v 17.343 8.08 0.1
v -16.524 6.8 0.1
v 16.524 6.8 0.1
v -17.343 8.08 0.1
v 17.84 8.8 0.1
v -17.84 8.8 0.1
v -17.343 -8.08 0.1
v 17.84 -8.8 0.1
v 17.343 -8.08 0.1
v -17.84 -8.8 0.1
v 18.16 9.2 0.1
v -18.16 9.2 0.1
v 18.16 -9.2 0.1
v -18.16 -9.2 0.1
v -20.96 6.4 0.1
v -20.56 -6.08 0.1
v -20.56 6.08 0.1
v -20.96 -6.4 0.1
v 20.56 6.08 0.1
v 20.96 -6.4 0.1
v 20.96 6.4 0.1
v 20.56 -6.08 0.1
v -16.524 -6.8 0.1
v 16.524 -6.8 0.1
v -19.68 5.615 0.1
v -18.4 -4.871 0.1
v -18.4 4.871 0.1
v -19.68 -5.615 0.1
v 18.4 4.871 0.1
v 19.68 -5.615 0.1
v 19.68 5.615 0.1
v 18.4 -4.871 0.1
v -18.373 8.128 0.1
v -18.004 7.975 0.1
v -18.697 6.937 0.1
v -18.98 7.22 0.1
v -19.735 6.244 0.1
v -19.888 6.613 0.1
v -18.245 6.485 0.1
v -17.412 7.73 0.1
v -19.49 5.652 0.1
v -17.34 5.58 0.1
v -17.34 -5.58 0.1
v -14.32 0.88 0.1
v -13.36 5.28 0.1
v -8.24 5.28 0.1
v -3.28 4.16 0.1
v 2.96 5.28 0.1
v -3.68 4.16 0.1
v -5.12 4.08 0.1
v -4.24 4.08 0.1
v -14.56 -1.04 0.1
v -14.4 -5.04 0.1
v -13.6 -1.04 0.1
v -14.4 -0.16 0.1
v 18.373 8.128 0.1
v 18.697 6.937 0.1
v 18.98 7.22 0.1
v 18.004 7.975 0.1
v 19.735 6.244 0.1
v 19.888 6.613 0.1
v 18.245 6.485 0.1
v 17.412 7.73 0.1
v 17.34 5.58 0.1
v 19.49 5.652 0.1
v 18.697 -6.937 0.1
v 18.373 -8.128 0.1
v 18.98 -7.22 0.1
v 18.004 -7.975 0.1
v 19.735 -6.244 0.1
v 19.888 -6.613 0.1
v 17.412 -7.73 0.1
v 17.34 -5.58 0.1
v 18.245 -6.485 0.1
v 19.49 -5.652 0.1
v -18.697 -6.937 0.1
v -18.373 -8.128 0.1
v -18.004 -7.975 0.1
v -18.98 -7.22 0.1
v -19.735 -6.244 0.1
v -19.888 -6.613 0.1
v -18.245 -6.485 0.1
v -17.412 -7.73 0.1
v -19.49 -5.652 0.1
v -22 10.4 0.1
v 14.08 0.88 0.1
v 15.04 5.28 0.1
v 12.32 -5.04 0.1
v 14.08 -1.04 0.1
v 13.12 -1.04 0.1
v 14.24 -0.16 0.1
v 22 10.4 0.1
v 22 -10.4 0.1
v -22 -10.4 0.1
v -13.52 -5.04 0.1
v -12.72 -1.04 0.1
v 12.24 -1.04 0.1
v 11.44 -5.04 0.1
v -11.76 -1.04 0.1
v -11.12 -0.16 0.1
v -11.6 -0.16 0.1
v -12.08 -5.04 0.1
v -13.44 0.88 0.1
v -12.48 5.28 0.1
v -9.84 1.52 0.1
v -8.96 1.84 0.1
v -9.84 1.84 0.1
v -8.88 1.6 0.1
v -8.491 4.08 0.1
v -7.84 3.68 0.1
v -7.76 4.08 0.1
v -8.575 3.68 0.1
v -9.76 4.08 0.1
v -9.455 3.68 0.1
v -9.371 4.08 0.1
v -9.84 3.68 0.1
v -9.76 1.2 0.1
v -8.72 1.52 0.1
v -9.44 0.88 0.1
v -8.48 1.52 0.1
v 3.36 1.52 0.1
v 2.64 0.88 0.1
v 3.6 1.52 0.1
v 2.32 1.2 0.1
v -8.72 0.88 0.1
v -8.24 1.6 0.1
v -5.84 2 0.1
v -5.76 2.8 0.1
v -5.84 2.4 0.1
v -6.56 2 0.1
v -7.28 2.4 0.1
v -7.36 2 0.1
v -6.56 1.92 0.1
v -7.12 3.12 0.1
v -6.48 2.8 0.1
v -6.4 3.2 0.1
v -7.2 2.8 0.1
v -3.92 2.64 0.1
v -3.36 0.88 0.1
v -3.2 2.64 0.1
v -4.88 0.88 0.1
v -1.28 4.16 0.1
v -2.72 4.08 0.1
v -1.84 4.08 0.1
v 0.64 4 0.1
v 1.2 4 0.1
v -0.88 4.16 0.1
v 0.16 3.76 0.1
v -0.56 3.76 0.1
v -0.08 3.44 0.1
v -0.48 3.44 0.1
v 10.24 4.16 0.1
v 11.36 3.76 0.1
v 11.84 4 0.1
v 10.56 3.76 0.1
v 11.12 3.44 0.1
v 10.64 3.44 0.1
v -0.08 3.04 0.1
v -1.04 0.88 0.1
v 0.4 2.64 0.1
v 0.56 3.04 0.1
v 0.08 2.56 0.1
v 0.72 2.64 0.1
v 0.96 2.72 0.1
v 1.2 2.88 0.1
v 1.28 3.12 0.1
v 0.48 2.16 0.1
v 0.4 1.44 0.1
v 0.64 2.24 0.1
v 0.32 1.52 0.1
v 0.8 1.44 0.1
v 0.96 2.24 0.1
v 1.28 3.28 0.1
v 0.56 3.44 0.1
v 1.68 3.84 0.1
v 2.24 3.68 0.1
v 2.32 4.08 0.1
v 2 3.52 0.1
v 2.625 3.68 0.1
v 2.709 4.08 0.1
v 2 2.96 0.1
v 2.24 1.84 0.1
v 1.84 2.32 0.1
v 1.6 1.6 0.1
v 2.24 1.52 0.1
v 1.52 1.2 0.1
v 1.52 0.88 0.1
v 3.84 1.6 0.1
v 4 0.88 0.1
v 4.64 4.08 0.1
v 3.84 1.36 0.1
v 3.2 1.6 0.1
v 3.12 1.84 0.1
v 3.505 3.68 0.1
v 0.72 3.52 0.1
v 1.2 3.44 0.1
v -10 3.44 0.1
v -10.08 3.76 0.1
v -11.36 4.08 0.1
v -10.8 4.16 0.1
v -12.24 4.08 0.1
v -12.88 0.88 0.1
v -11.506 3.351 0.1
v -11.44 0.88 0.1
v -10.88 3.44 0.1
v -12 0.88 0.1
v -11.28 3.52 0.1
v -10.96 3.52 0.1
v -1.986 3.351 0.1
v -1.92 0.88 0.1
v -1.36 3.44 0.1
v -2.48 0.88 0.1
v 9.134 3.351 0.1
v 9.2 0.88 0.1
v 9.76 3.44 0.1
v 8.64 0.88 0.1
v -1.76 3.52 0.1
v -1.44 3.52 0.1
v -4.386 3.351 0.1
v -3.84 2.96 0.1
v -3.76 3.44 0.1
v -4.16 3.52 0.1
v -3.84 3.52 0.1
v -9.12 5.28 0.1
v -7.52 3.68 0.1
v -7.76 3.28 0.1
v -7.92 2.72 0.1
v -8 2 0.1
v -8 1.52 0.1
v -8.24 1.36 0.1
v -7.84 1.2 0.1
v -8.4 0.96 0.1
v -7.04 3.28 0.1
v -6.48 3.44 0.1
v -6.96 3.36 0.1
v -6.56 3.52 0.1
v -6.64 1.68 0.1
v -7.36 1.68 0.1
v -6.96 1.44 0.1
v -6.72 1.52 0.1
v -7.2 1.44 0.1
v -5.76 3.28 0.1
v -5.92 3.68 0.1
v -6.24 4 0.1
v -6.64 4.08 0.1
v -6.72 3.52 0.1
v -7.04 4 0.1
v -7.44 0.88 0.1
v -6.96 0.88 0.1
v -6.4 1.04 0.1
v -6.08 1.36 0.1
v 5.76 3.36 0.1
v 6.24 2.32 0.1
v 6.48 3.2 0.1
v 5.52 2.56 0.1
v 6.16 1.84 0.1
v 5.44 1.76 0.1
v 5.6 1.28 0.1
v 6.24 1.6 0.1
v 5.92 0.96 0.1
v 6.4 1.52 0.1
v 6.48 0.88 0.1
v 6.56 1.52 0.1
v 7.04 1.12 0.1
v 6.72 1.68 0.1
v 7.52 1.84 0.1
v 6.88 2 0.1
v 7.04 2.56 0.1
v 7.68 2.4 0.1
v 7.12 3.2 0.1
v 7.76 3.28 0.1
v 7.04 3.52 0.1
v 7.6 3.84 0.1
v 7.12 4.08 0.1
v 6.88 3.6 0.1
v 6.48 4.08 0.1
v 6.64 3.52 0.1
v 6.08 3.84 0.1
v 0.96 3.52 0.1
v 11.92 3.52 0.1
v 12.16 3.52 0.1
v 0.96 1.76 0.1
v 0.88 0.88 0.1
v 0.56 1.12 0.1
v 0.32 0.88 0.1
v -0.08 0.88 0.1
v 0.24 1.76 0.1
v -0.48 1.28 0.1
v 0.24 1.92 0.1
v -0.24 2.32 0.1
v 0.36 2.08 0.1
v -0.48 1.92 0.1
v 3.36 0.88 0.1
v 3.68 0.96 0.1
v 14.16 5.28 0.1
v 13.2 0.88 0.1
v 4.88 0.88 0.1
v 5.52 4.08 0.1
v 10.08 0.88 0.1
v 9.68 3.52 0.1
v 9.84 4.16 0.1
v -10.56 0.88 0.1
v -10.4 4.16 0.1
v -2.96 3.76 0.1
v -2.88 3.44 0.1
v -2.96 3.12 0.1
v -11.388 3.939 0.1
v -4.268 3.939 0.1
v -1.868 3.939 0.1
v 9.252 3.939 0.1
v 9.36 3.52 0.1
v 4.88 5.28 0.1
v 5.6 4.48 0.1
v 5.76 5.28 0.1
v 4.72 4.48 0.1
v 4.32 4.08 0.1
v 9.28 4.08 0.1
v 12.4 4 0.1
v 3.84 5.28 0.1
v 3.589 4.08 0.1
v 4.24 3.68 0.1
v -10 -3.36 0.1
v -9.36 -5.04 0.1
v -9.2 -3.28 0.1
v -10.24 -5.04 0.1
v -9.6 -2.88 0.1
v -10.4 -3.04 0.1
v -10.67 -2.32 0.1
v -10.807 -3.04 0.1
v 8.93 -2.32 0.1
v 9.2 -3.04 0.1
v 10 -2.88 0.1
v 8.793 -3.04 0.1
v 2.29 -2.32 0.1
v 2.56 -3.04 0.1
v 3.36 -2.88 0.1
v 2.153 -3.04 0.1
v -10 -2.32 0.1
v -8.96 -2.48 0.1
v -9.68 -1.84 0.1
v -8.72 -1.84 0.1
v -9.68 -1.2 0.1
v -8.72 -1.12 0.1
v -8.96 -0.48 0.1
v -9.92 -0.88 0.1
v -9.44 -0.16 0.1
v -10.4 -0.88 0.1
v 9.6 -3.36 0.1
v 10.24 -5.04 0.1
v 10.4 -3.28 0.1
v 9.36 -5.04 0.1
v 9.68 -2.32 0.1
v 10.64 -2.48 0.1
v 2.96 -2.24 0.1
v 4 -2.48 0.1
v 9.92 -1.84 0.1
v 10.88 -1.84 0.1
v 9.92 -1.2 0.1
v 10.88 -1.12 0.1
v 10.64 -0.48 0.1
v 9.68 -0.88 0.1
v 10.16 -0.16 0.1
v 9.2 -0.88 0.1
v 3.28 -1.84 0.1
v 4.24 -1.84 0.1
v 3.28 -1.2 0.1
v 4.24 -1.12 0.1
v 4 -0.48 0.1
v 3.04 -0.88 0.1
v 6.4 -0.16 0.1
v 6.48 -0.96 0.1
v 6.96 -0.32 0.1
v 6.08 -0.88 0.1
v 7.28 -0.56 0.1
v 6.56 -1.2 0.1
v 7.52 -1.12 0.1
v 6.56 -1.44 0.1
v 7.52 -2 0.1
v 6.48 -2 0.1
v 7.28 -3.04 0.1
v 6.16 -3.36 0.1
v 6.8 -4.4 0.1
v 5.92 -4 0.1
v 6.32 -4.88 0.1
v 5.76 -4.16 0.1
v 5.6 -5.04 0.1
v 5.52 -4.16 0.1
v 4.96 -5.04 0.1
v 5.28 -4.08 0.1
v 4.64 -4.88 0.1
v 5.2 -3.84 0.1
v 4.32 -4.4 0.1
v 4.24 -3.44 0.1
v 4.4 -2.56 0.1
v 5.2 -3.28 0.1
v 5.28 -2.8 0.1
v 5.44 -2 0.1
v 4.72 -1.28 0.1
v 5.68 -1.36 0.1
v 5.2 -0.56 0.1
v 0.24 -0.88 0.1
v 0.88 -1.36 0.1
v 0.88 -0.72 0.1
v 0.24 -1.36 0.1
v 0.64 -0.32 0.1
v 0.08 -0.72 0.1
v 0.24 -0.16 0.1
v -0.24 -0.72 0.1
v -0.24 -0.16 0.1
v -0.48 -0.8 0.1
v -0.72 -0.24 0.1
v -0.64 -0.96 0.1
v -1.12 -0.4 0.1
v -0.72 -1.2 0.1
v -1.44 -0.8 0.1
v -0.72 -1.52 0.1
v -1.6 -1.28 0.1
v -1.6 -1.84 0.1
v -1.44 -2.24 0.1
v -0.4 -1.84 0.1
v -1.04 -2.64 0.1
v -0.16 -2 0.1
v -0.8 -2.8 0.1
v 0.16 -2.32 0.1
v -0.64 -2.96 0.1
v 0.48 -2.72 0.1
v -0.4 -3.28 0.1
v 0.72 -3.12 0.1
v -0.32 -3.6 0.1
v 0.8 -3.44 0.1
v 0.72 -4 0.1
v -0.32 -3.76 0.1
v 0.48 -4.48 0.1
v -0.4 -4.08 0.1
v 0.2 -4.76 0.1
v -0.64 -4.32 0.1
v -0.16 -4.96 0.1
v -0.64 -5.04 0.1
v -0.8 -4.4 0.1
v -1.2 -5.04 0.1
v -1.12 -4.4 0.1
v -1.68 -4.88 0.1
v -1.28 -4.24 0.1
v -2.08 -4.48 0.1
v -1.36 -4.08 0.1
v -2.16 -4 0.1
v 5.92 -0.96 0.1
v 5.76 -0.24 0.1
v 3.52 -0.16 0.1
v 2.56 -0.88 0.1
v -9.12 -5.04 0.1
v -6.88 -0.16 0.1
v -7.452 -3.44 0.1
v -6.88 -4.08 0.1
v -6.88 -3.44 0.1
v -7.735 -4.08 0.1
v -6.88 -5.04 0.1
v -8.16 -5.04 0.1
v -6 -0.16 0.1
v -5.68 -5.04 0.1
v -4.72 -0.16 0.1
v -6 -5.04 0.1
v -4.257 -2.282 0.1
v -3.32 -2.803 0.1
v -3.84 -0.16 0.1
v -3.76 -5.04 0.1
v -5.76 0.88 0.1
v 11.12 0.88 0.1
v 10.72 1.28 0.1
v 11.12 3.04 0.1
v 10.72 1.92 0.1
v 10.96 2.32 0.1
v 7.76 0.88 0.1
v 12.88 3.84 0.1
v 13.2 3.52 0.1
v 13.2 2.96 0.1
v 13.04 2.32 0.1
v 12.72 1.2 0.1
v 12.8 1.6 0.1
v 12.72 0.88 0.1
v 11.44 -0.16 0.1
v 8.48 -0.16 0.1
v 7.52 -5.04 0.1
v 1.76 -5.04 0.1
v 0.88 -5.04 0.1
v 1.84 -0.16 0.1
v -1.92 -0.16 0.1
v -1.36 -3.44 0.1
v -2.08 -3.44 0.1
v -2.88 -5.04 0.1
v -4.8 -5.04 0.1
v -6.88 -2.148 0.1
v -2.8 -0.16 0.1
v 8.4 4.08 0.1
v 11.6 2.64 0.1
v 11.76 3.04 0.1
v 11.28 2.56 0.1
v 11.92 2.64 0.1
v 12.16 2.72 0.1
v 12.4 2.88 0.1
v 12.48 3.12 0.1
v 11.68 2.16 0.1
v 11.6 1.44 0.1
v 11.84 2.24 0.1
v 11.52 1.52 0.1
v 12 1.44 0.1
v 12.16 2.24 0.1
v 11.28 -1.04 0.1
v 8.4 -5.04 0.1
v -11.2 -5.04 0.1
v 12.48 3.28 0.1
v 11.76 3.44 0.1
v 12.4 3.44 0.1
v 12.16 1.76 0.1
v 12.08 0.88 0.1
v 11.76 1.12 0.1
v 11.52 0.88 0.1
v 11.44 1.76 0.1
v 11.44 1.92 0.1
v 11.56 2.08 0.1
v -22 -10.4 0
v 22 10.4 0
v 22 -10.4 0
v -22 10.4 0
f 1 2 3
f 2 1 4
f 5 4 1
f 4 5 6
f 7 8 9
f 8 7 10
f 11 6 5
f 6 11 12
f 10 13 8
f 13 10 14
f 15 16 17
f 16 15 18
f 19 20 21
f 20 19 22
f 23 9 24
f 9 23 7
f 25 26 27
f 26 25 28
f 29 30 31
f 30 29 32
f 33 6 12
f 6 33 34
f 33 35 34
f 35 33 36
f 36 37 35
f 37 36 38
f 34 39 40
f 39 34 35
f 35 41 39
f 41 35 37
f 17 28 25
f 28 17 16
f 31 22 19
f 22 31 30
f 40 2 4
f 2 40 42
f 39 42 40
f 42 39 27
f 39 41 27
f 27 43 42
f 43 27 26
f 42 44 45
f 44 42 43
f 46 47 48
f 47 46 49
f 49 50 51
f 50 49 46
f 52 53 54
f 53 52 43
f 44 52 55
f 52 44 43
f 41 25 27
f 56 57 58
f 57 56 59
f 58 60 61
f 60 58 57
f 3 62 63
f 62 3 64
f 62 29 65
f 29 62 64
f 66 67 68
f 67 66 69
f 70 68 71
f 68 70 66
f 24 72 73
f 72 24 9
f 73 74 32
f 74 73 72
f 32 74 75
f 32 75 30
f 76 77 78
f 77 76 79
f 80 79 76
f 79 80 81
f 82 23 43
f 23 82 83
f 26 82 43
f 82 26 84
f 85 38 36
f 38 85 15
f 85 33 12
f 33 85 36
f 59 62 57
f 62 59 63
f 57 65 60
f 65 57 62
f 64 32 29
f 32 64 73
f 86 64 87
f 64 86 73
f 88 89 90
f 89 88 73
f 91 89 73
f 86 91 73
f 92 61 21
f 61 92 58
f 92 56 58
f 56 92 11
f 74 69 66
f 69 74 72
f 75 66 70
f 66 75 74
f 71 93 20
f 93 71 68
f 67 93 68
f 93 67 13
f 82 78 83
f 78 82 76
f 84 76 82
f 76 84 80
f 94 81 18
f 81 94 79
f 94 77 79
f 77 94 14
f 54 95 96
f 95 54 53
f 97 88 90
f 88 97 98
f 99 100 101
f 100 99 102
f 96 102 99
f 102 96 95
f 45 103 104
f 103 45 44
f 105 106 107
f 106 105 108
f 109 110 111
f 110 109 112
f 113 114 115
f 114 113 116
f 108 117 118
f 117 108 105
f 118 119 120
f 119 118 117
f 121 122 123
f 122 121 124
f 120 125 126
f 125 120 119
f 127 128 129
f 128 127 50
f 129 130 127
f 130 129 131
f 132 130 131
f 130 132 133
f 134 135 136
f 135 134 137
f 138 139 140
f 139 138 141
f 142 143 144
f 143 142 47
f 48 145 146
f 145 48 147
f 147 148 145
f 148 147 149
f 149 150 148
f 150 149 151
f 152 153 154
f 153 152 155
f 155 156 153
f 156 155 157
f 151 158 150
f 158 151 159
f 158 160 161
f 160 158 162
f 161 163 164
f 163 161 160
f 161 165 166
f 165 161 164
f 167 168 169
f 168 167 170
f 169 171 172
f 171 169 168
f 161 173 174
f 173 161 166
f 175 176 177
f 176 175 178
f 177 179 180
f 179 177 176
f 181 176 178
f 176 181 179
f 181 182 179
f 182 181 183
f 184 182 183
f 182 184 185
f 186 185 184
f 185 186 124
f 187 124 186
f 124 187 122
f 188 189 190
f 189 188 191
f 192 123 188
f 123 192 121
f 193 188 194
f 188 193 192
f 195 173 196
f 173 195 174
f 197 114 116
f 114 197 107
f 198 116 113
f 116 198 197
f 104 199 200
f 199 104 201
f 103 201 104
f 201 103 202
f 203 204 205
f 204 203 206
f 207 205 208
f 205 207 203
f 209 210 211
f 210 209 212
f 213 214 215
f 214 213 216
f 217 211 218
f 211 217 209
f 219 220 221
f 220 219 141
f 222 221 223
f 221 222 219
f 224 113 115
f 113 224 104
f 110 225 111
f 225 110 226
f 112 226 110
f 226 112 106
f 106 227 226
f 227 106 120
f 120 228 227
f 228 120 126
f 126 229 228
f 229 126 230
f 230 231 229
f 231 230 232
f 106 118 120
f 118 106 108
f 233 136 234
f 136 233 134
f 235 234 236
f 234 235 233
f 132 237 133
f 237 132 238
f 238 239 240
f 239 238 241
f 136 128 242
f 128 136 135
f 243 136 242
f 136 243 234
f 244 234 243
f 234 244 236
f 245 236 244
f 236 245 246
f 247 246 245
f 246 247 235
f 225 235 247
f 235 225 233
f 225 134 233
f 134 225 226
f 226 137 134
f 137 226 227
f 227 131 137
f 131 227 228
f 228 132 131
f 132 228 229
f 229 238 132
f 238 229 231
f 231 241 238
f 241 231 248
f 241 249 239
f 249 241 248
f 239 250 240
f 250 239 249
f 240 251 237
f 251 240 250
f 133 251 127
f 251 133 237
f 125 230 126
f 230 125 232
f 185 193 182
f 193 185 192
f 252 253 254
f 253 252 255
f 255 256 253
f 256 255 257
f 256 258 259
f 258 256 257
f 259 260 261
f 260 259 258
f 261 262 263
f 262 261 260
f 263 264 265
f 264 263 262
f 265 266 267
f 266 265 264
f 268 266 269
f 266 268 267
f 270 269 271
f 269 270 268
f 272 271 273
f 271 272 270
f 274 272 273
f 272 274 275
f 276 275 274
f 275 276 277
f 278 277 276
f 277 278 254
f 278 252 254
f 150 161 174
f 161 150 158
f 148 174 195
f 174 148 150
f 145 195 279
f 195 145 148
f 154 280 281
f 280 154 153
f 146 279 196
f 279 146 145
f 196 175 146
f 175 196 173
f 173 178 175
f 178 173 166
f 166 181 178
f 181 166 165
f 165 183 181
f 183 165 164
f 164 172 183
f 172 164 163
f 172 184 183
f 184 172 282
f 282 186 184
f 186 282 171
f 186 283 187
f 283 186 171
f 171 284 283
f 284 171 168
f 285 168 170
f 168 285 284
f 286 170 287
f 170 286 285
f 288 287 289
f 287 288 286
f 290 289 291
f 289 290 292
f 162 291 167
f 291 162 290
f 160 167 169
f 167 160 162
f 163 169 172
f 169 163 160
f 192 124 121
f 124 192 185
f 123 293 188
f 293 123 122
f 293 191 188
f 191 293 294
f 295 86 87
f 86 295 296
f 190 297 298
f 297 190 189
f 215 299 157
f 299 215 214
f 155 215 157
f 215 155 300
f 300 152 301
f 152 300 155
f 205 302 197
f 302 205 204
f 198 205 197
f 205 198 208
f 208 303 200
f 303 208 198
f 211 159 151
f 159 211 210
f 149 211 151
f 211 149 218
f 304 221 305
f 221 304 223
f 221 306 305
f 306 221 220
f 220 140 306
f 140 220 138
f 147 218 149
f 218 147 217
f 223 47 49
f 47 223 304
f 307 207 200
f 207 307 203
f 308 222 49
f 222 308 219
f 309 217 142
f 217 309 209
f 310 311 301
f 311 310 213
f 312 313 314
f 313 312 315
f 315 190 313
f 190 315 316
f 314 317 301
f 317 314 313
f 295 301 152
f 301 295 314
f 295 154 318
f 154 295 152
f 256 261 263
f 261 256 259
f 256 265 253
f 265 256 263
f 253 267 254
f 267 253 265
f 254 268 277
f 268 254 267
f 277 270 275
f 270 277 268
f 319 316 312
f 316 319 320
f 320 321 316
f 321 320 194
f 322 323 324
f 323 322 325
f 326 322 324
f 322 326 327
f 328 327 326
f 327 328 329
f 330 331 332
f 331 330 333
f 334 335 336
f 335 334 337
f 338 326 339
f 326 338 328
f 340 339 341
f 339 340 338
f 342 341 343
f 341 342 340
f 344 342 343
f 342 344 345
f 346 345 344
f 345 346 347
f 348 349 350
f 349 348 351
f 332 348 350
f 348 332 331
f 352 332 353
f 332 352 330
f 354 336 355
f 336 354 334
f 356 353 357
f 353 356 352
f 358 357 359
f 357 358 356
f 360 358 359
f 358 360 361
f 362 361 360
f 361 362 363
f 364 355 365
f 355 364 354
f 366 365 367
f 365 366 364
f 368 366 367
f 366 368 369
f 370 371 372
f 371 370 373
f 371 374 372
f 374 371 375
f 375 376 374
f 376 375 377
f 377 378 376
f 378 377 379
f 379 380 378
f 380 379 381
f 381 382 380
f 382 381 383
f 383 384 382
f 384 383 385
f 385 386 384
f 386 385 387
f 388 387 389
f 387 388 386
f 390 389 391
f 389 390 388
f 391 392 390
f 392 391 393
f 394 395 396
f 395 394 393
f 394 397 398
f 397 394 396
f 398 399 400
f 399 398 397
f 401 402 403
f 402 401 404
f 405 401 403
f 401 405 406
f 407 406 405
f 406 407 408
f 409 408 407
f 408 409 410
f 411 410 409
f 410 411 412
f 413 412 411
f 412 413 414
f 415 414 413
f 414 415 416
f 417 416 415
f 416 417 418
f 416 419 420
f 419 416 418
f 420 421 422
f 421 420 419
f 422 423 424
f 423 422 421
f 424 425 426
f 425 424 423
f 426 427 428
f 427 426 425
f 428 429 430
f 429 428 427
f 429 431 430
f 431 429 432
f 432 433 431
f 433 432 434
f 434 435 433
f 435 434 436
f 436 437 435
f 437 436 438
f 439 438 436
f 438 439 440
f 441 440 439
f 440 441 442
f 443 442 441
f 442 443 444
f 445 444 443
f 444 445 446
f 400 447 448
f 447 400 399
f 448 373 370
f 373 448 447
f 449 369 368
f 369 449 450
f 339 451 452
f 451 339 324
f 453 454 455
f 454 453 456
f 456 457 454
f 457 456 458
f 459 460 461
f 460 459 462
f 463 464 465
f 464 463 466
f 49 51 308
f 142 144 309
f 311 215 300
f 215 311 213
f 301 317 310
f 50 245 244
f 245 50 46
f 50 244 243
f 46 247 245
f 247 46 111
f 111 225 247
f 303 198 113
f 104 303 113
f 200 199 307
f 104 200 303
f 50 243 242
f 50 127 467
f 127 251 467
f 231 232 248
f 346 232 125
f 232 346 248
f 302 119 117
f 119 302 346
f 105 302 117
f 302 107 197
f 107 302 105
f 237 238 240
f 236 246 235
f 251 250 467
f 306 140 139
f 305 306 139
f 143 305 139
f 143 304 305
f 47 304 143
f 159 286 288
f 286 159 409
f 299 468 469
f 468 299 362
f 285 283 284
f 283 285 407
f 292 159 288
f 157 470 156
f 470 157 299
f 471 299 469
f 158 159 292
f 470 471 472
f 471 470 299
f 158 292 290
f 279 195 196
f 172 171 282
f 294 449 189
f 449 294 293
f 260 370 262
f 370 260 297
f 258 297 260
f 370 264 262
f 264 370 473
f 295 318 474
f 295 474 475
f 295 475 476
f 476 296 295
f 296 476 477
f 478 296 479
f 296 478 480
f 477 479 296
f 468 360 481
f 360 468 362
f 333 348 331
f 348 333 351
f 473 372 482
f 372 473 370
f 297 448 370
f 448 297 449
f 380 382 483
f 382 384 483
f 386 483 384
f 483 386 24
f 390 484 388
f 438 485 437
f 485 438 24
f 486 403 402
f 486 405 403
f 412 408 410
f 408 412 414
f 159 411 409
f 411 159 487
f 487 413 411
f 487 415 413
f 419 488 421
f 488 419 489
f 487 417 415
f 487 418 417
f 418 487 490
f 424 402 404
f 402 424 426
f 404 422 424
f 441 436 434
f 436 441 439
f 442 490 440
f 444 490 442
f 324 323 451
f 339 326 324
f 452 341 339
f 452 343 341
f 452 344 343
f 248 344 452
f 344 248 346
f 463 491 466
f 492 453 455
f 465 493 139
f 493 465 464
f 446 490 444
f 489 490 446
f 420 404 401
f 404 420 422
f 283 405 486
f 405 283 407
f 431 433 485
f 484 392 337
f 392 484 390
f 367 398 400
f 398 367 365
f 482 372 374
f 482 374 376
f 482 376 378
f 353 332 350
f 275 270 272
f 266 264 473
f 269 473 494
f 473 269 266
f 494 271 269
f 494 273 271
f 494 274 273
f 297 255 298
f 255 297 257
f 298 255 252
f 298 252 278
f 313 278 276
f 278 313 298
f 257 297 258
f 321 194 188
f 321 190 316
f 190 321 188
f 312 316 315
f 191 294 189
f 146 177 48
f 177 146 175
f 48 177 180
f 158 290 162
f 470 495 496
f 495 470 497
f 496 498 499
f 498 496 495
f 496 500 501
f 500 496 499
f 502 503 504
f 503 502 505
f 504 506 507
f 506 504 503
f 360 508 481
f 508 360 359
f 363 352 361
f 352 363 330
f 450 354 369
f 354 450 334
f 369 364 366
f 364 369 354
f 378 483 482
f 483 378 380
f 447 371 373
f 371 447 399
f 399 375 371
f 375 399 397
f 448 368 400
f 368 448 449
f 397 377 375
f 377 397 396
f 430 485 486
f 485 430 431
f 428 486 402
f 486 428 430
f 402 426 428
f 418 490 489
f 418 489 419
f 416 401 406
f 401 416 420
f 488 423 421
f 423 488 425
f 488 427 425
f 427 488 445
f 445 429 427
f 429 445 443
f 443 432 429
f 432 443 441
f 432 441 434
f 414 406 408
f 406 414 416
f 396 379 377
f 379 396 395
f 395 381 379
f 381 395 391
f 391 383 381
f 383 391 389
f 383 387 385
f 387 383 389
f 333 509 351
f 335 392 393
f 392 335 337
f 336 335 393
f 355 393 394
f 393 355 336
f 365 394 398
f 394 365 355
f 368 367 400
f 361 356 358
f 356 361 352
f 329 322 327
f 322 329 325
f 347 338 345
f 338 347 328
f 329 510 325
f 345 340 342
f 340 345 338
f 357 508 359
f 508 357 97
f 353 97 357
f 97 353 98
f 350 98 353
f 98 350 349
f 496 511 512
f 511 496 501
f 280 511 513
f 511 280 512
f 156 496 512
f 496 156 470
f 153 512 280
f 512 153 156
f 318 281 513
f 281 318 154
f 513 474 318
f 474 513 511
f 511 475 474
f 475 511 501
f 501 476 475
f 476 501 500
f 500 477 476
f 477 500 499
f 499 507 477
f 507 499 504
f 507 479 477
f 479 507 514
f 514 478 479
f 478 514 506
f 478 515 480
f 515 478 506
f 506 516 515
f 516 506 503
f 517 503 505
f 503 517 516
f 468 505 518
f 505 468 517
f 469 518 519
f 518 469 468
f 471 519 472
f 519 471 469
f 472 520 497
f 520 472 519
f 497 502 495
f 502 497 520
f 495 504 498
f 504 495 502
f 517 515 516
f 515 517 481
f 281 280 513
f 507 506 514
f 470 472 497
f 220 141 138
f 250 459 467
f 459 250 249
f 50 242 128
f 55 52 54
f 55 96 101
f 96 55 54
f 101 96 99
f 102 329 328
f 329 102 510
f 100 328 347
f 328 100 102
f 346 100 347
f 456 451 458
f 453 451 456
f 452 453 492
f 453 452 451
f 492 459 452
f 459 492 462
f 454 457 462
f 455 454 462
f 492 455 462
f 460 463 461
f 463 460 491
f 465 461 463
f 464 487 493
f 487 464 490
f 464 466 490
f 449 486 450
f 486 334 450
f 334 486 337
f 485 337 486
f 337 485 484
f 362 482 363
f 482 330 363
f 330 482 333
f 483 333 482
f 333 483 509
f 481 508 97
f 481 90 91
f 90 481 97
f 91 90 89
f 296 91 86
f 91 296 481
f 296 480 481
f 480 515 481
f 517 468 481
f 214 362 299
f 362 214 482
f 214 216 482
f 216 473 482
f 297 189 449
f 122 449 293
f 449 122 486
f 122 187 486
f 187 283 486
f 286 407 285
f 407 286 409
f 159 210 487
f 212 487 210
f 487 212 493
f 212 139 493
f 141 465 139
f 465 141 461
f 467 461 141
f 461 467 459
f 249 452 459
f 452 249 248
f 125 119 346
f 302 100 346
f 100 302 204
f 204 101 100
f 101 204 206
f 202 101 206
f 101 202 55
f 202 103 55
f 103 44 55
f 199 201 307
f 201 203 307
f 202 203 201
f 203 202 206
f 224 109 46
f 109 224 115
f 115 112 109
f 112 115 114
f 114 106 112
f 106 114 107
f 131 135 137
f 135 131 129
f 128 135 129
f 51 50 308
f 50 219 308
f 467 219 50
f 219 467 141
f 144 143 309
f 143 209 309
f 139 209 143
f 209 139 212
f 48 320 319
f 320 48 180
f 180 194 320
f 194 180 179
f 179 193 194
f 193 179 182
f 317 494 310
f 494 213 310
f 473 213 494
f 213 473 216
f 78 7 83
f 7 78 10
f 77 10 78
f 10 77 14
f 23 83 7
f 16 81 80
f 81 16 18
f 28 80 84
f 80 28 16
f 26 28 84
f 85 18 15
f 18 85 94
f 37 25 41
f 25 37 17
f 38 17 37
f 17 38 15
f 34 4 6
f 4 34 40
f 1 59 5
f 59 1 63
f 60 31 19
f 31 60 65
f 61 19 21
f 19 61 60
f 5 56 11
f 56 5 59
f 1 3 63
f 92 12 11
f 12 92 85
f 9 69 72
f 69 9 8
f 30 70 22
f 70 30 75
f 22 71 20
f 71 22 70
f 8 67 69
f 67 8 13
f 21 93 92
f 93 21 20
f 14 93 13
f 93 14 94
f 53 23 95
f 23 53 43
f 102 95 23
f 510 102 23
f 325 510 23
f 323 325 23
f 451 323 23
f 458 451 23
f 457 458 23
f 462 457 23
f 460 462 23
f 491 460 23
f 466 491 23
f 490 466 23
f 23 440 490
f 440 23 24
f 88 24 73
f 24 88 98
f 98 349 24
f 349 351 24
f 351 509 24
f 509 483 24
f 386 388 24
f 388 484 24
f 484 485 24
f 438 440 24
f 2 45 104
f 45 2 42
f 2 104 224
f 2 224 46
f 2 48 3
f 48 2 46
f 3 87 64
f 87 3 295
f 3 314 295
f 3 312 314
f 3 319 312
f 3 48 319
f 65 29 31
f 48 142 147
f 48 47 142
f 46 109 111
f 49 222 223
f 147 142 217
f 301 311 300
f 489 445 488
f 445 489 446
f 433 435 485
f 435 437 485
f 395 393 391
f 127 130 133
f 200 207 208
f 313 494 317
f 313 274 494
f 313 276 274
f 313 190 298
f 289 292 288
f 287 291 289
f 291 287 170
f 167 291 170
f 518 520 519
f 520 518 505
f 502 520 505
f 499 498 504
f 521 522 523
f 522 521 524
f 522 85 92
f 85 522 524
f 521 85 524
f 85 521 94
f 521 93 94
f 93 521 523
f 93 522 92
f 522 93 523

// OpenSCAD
use <../lib.scad>
use <003440a.scad>
function ldraw_lib__003437b() = [
// 0 =Sticker  2.6 x  5.5 with Black "International TRANSPORT" on Yellow
// 0 Name: 003437b.dat
// 0 Author: Alex Taylor [anathema]
// 0 !LDRAW_ORG Part Alias UPDATE 2020-01
// 0 !LICENSE Licensed under CC BY 2.0 and CC BY 4.0 : see CAreadme.txt
// 
// 0 BFC CERTIFY CCW
  [0,"BFC","CERTIFY"],
  [0,"BFC","CCW"],
// 
// 0 !KEYWORDS set 181, Train
// 
// 0 !HISTORY 2020-06-28 [PTadmin] Official Update 2020-01
// 
// 
// 1 16 0 0 0 1 0 0 0 1 0 0 0 1 003440a.dat
  [1,16,0,0,0,1,0,0,0,1,0,0,0,1, ldraw_lib__003440a()],
];
module ldraw_lib__003437b(step=0, col=false, unit=2/5, alt=false, line=0.2, solid=!$preview)
    makepoly(ldraw_lib__003437b(), step=step, col=col, unit=unit, alt=alt, line=line, solid=solid);
ldraw_lib__003437b(line=0.2);
